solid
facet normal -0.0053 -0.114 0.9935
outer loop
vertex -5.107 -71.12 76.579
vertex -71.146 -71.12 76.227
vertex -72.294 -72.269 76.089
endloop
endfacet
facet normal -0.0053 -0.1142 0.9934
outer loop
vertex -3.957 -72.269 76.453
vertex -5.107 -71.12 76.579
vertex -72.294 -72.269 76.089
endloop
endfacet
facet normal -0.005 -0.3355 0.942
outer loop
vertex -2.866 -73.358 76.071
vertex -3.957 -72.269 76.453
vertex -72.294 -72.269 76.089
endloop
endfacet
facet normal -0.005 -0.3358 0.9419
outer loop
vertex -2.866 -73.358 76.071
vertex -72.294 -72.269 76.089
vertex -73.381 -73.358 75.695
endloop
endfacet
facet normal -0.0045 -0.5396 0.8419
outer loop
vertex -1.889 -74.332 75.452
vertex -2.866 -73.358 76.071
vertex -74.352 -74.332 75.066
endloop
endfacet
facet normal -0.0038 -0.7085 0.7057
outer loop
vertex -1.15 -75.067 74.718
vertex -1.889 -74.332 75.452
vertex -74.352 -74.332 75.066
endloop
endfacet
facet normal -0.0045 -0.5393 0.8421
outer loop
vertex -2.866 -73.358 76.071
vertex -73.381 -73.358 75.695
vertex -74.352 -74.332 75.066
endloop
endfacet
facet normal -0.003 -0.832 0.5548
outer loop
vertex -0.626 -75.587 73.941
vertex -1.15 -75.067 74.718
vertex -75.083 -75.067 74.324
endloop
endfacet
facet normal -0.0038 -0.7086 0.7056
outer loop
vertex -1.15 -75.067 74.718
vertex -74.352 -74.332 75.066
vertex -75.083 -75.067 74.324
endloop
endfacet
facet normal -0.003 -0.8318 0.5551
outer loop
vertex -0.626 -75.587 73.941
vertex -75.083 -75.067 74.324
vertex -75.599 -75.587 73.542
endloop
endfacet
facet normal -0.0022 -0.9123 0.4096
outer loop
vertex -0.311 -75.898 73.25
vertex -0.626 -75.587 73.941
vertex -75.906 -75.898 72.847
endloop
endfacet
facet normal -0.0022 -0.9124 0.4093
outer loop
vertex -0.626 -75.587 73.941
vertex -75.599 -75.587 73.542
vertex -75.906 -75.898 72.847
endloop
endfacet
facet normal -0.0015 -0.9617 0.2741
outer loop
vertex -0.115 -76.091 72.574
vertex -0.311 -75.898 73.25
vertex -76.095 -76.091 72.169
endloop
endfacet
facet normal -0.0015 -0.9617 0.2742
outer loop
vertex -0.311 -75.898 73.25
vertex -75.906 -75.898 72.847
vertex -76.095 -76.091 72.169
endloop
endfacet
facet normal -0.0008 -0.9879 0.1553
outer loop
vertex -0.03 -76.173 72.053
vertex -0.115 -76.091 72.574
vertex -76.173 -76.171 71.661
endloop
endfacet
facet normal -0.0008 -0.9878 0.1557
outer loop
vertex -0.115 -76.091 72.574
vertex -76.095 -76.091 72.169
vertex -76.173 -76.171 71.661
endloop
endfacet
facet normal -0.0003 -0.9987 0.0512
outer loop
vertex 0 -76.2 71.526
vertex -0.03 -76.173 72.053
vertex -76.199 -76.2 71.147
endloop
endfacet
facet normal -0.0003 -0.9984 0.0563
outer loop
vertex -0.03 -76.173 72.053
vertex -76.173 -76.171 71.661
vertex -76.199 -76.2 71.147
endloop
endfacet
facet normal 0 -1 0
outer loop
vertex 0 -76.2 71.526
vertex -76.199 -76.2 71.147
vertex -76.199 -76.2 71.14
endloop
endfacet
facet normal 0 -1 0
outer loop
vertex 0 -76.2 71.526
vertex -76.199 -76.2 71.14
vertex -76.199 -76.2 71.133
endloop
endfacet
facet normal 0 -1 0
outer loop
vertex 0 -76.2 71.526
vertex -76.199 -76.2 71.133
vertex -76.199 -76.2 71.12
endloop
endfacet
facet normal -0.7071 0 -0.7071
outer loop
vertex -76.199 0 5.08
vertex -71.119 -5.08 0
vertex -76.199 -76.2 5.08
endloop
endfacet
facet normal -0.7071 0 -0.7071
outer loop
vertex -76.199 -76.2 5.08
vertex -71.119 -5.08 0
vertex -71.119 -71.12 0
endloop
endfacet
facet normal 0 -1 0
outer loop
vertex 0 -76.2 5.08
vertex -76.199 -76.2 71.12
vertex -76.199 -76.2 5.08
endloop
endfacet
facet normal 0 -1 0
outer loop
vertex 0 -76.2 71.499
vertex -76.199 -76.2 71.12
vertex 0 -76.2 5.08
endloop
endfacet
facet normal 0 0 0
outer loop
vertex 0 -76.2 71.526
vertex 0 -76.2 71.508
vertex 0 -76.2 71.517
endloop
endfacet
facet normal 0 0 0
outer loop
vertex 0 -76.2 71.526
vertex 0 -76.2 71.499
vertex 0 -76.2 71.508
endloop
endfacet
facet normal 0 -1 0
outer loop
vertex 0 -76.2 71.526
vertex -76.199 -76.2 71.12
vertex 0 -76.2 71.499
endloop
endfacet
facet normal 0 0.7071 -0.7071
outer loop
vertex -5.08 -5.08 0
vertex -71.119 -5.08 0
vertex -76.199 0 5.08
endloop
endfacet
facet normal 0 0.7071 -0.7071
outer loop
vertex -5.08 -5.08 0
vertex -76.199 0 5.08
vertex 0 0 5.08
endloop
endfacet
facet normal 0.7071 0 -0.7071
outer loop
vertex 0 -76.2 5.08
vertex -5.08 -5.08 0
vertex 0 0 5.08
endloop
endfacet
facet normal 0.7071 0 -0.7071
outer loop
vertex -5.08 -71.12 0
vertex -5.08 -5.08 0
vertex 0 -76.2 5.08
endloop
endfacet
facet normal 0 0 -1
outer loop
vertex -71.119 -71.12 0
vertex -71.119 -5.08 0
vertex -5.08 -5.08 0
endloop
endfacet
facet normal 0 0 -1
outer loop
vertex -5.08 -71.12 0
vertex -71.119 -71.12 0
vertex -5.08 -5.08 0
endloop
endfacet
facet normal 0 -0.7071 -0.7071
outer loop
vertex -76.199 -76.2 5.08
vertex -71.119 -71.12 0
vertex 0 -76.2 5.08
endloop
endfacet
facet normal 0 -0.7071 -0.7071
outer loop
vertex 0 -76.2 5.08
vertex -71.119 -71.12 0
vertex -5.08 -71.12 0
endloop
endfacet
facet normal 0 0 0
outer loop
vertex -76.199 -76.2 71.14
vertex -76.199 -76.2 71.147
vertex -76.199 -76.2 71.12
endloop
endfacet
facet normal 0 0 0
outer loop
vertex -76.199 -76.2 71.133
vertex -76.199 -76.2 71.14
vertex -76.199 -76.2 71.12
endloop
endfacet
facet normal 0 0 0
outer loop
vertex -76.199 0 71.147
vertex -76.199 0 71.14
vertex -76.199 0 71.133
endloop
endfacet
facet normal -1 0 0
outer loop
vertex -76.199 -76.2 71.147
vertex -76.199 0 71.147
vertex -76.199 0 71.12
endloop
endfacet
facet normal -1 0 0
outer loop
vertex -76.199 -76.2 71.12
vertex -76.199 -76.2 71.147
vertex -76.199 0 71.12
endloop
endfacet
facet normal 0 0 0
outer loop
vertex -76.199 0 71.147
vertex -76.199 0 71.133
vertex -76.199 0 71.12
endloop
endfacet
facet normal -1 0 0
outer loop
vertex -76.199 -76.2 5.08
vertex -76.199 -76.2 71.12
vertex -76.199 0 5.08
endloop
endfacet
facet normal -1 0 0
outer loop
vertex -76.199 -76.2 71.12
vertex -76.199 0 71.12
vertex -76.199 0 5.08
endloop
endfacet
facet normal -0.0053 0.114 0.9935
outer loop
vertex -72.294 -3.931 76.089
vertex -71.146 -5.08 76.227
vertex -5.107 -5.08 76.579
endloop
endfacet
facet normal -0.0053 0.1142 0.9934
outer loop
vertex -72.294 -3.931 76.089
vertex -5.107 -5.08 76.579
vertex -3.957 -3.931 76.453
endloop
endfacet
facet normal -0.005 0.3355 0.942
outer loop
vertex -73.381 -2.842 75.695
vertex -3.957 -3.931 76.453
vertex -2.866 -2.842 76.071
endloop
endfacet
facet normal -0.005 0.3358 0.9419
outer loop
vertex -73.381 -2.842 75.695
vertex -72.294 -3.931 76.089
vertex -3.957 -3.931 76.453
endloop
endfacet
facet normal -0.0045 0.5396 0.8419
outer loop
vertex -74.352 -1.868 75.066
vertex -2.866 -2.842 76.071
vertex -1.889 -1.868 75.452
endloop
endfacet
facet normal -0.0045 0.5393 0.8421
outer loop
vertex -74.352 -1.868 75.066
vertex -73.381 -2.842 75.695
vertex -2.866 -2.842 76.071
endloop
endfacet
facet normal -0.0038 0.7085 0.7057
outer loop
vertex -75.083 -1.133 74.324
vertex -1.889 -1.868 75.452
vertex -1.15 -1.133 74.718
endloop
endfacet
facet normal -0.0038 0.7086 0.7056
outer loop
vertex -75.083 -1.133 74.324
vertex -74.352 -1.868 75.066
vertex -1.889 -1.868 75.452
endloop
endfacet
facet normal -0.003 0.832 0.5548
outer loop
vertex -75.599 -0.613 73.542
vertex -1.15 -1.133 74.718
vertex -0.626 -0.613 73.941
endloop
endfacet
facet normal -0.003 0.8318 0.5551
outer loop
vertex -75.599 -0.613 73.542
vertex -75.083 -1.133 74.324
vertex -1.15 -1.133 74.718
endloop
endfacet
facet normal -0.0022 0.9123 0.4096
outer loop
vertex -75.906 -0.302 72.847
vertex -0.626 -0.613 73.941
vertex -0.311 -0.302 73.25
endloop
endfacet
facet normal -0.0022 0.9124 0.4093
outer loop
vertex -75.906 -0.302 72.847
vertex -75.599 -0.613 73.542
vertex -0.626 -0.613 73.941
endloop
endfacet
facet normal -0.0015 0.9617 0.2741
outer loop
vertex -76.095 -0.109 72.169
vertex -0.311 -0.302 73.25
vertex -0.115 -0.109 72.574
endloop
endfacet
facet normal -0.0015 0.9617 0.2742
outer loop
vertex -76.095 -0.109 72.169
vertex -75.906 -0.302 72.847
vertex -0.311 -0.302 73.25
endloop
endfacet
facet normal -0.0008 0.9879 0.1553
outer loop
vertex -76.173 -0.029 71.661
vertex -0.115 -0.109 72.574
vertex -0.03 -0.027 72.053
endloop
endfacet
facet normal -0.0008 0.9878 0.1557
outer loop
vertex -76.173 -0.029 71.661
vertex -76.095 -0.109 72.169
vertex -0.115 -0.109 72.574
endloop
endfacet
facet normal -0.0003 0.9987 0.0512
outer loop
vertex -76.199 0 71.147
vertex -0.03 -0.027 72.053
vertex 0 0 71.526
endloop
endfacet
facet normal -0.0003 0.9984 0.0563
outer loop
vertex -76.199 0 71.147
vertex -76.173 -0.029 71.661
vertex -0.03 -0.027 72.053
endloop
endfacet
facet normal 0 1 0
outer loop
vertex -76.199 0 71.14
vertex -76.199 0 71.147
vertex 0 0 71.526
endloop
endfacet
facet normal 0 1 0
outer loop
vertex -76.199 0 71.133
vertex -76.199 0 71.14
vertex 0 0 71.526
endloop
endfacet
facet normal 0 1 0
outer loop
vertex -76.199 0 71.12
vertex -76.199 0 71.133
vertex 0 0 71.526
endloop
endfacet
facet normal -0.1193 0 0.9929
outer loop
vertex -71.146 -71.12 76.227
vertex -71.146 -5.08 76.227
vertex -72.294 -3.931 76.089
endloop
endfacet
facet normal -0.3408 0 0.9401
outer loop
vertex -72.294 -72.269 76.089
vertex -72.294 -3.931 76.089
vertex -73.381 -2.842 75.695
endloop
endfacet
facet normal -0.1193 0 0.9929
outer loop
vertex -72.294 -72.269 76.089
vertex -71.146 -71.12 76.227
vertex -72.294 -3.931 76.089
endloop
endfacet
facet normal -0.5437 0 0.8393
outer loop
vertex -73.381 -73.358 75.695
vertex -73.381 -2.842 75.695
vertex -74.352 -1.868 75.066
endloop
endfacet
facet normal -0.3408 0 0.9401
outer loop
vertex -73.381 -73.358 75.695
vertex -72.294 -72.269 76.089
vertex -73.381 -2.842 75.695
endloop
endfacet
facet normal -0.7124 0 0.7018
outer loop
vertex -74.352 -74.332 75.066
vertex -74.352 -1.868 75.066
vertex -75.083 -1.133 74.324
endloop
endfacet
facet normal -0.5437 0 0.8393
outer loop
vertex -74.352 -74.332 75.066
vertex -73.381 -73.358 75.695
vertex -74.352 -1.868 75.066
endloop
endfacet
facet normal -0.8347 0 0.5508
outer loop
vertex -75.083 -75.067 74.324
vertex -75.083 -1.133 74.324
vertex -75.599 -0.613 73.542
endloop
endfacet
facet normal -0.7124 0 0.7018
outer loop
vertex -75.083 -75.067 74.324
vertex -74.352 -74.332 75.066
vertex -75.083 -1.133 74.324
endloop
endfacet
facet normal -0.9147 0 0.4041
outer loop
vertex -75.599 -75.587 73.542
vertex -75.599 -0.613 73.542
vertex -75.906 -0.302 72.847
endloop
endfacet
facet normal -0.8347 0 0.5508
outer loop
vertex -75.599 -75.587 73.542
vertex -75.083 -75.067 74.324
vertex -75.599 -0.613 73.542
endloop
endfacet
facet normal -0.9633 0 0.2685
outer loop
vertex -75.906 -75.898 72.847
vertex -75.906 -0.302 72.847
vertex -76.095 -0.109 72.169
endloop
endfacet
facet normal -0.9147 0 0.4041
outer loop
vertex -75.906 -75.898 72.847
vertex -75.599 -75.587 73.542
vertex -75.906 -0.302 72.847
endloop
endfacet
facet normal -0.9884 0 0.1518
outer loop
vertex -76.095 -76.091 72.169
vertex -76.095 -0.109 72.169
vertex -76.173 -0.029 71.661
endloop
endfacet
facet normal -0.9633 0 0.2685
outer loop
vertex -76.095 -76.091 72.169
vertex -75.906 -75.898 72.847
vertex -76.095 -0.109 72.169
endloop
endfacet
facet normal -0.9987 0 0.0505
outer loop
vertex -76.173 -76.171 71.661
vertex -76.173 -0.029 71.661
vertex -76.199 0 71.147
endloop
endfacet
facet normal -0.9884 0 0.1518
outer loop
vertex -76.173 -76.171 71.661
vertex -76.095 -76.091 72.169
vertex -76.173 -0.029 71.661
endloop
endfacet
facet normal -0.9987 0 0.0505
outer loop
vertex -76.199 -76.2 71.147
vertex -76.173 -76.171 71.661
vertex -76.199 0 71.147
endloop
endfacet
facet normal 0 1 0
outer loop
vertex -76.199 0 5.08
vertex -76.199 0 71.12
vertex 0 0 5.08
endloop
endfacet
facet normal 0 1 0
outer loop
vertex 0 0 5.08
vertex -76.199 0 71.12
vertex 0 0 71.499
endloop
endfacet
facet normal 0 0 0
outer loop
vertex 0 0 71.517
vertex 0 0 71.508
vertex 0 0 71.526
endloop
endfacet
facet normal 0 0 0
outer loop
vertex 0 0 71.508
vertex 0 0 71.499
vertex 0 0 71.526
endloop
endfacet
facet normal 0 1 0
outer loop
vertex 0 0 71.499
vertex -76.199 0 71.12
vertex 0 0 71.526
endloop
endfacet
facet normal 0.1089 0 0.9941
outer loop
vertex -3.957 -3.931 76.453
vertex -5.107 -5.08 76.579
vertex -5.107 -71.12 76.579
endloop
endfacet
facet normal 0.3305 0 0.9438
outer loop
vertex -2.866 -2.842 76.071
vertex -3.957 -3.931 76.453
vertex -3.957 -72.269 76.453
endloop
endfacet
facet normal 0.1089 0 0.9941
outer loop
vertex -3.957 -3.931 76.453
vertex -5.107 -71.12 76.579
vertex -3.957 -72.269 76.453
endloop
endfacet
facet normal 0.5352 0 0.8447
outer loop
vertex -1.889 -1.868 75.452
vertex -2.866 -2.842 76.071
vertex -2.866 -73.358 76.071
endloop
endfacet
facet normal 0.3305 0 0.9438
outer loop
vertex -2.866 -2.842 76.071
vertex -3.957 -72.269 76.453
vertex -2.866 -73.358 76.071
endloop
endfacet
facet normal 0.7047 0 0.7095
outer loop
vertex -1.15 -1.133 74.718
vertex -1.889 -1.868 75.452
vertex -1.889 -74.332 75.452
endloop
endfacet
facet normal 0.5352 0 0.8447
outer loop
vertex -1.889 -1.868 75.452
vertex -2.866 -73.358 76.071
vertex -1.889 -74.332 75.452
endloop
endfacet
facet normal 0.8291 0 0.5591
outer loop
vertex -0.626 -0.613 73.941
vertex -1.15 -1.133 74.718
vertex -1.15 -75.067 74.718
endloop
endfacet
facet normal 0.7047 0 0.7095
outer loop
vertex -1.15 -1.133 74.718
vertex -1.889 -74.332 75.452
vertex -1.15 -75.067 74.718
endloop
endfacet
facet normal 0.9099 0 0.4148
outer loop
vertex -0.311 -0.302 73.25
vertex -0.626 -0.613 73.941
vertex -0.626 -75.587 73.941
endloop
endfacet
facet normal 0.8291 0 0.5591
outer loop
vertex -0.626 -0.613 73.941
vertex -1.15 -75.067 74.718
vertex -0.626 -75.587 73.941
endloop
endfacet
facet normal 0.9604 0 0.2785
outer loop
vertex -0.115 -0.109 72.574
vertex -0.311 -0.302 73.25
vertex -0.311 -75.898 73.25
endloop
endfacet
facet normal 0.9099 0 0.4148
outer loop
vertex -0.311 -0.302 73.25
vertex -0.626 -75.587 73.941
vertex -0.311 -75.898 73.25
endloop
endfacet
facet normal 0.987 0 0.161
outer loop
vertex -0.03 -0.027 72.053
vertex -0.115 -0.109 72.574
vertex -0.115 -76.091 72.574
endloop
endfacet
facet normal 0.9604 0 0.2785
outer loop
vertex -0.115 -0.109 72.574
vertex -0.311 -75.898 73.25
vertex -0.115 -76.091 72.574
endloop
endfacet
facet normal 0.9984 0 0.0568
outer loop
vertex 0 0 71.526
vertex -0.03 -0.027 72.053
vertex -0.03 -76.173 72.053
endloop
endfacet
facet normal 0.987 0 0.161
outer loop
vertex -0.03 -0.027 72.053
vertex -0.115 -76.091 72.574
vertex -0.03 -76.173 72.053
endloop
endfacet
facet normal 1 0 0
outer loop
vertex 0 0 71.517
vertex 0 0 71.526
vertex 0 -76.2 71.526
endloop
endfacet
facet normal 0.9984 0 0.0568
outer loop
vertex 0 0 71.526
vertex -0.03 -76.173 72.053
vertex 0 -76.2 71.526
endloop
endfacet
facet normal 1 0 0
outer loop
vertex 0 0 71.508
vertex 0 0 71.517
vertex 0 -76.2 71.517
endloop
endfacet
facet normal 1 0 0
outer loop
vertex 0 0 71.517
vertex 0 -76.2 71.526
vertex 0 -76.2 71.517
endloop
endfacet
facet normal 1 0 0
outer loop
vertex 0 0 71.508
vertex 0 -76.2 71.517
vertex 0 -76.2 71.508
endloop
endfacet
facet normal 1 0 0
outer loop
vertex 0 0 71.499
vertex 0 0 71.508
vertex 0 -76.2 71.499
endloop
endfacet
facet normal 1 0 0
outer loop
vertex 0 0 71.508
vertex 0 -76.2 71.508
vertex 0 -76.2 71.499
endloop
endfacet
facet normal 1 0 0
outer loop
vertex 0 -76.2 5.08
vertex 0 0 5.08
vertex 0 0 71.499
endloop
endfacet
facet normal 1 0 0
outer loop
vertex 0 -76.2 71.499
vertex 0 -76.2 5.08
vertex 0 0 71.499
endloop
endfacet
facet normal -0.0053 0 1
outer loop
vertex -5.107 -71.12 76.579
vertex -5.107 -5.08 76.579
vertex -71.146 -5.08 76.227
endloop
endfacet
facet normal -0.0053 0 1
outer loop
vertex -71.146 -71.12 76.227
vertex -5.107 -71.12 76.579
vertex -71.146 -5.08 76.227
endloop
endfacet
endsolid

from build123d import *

# Parameters (mm, degrees)
F1_DEPTH = 76.2
F2_R     = 5.08
F3_SIZE  = 5.08


with BuildPart() as f1:
    # F0 (on Front) → F1 (new body)
    with BuildSketch(Plane.XZ):
        Polygon((0, 76.605852), (-76.198919, 76.2), (-76.198919, 0), (0, 0), align=None)
    extrude(amount=F1_DEPTH)

    # F2
    f2_edges = [f1.edges().sort_by_distance(p)[0] for p in [
        (-38.09946, 0, 76.402926),
        (-76.198919, -38.1, 76.2),
        (0, -38.1, 76.605852),
        (-38.09946, -76.2, 76.402926),
    ]]
    fillet(f2_edges, radius=F2_R)

    # F3
    f3_edges = [f1.edges().sort_by_distance(p)[0] for p in [
        (-76.198919, -38.1, 0),
        (-38.09946, -76.2, 0),
        (0, -38.1, 0),
        (-38.09946, 0, 0),
    ]]
    chamfer(f3_edges, length=F3_SIZE)


solid = f1.part
